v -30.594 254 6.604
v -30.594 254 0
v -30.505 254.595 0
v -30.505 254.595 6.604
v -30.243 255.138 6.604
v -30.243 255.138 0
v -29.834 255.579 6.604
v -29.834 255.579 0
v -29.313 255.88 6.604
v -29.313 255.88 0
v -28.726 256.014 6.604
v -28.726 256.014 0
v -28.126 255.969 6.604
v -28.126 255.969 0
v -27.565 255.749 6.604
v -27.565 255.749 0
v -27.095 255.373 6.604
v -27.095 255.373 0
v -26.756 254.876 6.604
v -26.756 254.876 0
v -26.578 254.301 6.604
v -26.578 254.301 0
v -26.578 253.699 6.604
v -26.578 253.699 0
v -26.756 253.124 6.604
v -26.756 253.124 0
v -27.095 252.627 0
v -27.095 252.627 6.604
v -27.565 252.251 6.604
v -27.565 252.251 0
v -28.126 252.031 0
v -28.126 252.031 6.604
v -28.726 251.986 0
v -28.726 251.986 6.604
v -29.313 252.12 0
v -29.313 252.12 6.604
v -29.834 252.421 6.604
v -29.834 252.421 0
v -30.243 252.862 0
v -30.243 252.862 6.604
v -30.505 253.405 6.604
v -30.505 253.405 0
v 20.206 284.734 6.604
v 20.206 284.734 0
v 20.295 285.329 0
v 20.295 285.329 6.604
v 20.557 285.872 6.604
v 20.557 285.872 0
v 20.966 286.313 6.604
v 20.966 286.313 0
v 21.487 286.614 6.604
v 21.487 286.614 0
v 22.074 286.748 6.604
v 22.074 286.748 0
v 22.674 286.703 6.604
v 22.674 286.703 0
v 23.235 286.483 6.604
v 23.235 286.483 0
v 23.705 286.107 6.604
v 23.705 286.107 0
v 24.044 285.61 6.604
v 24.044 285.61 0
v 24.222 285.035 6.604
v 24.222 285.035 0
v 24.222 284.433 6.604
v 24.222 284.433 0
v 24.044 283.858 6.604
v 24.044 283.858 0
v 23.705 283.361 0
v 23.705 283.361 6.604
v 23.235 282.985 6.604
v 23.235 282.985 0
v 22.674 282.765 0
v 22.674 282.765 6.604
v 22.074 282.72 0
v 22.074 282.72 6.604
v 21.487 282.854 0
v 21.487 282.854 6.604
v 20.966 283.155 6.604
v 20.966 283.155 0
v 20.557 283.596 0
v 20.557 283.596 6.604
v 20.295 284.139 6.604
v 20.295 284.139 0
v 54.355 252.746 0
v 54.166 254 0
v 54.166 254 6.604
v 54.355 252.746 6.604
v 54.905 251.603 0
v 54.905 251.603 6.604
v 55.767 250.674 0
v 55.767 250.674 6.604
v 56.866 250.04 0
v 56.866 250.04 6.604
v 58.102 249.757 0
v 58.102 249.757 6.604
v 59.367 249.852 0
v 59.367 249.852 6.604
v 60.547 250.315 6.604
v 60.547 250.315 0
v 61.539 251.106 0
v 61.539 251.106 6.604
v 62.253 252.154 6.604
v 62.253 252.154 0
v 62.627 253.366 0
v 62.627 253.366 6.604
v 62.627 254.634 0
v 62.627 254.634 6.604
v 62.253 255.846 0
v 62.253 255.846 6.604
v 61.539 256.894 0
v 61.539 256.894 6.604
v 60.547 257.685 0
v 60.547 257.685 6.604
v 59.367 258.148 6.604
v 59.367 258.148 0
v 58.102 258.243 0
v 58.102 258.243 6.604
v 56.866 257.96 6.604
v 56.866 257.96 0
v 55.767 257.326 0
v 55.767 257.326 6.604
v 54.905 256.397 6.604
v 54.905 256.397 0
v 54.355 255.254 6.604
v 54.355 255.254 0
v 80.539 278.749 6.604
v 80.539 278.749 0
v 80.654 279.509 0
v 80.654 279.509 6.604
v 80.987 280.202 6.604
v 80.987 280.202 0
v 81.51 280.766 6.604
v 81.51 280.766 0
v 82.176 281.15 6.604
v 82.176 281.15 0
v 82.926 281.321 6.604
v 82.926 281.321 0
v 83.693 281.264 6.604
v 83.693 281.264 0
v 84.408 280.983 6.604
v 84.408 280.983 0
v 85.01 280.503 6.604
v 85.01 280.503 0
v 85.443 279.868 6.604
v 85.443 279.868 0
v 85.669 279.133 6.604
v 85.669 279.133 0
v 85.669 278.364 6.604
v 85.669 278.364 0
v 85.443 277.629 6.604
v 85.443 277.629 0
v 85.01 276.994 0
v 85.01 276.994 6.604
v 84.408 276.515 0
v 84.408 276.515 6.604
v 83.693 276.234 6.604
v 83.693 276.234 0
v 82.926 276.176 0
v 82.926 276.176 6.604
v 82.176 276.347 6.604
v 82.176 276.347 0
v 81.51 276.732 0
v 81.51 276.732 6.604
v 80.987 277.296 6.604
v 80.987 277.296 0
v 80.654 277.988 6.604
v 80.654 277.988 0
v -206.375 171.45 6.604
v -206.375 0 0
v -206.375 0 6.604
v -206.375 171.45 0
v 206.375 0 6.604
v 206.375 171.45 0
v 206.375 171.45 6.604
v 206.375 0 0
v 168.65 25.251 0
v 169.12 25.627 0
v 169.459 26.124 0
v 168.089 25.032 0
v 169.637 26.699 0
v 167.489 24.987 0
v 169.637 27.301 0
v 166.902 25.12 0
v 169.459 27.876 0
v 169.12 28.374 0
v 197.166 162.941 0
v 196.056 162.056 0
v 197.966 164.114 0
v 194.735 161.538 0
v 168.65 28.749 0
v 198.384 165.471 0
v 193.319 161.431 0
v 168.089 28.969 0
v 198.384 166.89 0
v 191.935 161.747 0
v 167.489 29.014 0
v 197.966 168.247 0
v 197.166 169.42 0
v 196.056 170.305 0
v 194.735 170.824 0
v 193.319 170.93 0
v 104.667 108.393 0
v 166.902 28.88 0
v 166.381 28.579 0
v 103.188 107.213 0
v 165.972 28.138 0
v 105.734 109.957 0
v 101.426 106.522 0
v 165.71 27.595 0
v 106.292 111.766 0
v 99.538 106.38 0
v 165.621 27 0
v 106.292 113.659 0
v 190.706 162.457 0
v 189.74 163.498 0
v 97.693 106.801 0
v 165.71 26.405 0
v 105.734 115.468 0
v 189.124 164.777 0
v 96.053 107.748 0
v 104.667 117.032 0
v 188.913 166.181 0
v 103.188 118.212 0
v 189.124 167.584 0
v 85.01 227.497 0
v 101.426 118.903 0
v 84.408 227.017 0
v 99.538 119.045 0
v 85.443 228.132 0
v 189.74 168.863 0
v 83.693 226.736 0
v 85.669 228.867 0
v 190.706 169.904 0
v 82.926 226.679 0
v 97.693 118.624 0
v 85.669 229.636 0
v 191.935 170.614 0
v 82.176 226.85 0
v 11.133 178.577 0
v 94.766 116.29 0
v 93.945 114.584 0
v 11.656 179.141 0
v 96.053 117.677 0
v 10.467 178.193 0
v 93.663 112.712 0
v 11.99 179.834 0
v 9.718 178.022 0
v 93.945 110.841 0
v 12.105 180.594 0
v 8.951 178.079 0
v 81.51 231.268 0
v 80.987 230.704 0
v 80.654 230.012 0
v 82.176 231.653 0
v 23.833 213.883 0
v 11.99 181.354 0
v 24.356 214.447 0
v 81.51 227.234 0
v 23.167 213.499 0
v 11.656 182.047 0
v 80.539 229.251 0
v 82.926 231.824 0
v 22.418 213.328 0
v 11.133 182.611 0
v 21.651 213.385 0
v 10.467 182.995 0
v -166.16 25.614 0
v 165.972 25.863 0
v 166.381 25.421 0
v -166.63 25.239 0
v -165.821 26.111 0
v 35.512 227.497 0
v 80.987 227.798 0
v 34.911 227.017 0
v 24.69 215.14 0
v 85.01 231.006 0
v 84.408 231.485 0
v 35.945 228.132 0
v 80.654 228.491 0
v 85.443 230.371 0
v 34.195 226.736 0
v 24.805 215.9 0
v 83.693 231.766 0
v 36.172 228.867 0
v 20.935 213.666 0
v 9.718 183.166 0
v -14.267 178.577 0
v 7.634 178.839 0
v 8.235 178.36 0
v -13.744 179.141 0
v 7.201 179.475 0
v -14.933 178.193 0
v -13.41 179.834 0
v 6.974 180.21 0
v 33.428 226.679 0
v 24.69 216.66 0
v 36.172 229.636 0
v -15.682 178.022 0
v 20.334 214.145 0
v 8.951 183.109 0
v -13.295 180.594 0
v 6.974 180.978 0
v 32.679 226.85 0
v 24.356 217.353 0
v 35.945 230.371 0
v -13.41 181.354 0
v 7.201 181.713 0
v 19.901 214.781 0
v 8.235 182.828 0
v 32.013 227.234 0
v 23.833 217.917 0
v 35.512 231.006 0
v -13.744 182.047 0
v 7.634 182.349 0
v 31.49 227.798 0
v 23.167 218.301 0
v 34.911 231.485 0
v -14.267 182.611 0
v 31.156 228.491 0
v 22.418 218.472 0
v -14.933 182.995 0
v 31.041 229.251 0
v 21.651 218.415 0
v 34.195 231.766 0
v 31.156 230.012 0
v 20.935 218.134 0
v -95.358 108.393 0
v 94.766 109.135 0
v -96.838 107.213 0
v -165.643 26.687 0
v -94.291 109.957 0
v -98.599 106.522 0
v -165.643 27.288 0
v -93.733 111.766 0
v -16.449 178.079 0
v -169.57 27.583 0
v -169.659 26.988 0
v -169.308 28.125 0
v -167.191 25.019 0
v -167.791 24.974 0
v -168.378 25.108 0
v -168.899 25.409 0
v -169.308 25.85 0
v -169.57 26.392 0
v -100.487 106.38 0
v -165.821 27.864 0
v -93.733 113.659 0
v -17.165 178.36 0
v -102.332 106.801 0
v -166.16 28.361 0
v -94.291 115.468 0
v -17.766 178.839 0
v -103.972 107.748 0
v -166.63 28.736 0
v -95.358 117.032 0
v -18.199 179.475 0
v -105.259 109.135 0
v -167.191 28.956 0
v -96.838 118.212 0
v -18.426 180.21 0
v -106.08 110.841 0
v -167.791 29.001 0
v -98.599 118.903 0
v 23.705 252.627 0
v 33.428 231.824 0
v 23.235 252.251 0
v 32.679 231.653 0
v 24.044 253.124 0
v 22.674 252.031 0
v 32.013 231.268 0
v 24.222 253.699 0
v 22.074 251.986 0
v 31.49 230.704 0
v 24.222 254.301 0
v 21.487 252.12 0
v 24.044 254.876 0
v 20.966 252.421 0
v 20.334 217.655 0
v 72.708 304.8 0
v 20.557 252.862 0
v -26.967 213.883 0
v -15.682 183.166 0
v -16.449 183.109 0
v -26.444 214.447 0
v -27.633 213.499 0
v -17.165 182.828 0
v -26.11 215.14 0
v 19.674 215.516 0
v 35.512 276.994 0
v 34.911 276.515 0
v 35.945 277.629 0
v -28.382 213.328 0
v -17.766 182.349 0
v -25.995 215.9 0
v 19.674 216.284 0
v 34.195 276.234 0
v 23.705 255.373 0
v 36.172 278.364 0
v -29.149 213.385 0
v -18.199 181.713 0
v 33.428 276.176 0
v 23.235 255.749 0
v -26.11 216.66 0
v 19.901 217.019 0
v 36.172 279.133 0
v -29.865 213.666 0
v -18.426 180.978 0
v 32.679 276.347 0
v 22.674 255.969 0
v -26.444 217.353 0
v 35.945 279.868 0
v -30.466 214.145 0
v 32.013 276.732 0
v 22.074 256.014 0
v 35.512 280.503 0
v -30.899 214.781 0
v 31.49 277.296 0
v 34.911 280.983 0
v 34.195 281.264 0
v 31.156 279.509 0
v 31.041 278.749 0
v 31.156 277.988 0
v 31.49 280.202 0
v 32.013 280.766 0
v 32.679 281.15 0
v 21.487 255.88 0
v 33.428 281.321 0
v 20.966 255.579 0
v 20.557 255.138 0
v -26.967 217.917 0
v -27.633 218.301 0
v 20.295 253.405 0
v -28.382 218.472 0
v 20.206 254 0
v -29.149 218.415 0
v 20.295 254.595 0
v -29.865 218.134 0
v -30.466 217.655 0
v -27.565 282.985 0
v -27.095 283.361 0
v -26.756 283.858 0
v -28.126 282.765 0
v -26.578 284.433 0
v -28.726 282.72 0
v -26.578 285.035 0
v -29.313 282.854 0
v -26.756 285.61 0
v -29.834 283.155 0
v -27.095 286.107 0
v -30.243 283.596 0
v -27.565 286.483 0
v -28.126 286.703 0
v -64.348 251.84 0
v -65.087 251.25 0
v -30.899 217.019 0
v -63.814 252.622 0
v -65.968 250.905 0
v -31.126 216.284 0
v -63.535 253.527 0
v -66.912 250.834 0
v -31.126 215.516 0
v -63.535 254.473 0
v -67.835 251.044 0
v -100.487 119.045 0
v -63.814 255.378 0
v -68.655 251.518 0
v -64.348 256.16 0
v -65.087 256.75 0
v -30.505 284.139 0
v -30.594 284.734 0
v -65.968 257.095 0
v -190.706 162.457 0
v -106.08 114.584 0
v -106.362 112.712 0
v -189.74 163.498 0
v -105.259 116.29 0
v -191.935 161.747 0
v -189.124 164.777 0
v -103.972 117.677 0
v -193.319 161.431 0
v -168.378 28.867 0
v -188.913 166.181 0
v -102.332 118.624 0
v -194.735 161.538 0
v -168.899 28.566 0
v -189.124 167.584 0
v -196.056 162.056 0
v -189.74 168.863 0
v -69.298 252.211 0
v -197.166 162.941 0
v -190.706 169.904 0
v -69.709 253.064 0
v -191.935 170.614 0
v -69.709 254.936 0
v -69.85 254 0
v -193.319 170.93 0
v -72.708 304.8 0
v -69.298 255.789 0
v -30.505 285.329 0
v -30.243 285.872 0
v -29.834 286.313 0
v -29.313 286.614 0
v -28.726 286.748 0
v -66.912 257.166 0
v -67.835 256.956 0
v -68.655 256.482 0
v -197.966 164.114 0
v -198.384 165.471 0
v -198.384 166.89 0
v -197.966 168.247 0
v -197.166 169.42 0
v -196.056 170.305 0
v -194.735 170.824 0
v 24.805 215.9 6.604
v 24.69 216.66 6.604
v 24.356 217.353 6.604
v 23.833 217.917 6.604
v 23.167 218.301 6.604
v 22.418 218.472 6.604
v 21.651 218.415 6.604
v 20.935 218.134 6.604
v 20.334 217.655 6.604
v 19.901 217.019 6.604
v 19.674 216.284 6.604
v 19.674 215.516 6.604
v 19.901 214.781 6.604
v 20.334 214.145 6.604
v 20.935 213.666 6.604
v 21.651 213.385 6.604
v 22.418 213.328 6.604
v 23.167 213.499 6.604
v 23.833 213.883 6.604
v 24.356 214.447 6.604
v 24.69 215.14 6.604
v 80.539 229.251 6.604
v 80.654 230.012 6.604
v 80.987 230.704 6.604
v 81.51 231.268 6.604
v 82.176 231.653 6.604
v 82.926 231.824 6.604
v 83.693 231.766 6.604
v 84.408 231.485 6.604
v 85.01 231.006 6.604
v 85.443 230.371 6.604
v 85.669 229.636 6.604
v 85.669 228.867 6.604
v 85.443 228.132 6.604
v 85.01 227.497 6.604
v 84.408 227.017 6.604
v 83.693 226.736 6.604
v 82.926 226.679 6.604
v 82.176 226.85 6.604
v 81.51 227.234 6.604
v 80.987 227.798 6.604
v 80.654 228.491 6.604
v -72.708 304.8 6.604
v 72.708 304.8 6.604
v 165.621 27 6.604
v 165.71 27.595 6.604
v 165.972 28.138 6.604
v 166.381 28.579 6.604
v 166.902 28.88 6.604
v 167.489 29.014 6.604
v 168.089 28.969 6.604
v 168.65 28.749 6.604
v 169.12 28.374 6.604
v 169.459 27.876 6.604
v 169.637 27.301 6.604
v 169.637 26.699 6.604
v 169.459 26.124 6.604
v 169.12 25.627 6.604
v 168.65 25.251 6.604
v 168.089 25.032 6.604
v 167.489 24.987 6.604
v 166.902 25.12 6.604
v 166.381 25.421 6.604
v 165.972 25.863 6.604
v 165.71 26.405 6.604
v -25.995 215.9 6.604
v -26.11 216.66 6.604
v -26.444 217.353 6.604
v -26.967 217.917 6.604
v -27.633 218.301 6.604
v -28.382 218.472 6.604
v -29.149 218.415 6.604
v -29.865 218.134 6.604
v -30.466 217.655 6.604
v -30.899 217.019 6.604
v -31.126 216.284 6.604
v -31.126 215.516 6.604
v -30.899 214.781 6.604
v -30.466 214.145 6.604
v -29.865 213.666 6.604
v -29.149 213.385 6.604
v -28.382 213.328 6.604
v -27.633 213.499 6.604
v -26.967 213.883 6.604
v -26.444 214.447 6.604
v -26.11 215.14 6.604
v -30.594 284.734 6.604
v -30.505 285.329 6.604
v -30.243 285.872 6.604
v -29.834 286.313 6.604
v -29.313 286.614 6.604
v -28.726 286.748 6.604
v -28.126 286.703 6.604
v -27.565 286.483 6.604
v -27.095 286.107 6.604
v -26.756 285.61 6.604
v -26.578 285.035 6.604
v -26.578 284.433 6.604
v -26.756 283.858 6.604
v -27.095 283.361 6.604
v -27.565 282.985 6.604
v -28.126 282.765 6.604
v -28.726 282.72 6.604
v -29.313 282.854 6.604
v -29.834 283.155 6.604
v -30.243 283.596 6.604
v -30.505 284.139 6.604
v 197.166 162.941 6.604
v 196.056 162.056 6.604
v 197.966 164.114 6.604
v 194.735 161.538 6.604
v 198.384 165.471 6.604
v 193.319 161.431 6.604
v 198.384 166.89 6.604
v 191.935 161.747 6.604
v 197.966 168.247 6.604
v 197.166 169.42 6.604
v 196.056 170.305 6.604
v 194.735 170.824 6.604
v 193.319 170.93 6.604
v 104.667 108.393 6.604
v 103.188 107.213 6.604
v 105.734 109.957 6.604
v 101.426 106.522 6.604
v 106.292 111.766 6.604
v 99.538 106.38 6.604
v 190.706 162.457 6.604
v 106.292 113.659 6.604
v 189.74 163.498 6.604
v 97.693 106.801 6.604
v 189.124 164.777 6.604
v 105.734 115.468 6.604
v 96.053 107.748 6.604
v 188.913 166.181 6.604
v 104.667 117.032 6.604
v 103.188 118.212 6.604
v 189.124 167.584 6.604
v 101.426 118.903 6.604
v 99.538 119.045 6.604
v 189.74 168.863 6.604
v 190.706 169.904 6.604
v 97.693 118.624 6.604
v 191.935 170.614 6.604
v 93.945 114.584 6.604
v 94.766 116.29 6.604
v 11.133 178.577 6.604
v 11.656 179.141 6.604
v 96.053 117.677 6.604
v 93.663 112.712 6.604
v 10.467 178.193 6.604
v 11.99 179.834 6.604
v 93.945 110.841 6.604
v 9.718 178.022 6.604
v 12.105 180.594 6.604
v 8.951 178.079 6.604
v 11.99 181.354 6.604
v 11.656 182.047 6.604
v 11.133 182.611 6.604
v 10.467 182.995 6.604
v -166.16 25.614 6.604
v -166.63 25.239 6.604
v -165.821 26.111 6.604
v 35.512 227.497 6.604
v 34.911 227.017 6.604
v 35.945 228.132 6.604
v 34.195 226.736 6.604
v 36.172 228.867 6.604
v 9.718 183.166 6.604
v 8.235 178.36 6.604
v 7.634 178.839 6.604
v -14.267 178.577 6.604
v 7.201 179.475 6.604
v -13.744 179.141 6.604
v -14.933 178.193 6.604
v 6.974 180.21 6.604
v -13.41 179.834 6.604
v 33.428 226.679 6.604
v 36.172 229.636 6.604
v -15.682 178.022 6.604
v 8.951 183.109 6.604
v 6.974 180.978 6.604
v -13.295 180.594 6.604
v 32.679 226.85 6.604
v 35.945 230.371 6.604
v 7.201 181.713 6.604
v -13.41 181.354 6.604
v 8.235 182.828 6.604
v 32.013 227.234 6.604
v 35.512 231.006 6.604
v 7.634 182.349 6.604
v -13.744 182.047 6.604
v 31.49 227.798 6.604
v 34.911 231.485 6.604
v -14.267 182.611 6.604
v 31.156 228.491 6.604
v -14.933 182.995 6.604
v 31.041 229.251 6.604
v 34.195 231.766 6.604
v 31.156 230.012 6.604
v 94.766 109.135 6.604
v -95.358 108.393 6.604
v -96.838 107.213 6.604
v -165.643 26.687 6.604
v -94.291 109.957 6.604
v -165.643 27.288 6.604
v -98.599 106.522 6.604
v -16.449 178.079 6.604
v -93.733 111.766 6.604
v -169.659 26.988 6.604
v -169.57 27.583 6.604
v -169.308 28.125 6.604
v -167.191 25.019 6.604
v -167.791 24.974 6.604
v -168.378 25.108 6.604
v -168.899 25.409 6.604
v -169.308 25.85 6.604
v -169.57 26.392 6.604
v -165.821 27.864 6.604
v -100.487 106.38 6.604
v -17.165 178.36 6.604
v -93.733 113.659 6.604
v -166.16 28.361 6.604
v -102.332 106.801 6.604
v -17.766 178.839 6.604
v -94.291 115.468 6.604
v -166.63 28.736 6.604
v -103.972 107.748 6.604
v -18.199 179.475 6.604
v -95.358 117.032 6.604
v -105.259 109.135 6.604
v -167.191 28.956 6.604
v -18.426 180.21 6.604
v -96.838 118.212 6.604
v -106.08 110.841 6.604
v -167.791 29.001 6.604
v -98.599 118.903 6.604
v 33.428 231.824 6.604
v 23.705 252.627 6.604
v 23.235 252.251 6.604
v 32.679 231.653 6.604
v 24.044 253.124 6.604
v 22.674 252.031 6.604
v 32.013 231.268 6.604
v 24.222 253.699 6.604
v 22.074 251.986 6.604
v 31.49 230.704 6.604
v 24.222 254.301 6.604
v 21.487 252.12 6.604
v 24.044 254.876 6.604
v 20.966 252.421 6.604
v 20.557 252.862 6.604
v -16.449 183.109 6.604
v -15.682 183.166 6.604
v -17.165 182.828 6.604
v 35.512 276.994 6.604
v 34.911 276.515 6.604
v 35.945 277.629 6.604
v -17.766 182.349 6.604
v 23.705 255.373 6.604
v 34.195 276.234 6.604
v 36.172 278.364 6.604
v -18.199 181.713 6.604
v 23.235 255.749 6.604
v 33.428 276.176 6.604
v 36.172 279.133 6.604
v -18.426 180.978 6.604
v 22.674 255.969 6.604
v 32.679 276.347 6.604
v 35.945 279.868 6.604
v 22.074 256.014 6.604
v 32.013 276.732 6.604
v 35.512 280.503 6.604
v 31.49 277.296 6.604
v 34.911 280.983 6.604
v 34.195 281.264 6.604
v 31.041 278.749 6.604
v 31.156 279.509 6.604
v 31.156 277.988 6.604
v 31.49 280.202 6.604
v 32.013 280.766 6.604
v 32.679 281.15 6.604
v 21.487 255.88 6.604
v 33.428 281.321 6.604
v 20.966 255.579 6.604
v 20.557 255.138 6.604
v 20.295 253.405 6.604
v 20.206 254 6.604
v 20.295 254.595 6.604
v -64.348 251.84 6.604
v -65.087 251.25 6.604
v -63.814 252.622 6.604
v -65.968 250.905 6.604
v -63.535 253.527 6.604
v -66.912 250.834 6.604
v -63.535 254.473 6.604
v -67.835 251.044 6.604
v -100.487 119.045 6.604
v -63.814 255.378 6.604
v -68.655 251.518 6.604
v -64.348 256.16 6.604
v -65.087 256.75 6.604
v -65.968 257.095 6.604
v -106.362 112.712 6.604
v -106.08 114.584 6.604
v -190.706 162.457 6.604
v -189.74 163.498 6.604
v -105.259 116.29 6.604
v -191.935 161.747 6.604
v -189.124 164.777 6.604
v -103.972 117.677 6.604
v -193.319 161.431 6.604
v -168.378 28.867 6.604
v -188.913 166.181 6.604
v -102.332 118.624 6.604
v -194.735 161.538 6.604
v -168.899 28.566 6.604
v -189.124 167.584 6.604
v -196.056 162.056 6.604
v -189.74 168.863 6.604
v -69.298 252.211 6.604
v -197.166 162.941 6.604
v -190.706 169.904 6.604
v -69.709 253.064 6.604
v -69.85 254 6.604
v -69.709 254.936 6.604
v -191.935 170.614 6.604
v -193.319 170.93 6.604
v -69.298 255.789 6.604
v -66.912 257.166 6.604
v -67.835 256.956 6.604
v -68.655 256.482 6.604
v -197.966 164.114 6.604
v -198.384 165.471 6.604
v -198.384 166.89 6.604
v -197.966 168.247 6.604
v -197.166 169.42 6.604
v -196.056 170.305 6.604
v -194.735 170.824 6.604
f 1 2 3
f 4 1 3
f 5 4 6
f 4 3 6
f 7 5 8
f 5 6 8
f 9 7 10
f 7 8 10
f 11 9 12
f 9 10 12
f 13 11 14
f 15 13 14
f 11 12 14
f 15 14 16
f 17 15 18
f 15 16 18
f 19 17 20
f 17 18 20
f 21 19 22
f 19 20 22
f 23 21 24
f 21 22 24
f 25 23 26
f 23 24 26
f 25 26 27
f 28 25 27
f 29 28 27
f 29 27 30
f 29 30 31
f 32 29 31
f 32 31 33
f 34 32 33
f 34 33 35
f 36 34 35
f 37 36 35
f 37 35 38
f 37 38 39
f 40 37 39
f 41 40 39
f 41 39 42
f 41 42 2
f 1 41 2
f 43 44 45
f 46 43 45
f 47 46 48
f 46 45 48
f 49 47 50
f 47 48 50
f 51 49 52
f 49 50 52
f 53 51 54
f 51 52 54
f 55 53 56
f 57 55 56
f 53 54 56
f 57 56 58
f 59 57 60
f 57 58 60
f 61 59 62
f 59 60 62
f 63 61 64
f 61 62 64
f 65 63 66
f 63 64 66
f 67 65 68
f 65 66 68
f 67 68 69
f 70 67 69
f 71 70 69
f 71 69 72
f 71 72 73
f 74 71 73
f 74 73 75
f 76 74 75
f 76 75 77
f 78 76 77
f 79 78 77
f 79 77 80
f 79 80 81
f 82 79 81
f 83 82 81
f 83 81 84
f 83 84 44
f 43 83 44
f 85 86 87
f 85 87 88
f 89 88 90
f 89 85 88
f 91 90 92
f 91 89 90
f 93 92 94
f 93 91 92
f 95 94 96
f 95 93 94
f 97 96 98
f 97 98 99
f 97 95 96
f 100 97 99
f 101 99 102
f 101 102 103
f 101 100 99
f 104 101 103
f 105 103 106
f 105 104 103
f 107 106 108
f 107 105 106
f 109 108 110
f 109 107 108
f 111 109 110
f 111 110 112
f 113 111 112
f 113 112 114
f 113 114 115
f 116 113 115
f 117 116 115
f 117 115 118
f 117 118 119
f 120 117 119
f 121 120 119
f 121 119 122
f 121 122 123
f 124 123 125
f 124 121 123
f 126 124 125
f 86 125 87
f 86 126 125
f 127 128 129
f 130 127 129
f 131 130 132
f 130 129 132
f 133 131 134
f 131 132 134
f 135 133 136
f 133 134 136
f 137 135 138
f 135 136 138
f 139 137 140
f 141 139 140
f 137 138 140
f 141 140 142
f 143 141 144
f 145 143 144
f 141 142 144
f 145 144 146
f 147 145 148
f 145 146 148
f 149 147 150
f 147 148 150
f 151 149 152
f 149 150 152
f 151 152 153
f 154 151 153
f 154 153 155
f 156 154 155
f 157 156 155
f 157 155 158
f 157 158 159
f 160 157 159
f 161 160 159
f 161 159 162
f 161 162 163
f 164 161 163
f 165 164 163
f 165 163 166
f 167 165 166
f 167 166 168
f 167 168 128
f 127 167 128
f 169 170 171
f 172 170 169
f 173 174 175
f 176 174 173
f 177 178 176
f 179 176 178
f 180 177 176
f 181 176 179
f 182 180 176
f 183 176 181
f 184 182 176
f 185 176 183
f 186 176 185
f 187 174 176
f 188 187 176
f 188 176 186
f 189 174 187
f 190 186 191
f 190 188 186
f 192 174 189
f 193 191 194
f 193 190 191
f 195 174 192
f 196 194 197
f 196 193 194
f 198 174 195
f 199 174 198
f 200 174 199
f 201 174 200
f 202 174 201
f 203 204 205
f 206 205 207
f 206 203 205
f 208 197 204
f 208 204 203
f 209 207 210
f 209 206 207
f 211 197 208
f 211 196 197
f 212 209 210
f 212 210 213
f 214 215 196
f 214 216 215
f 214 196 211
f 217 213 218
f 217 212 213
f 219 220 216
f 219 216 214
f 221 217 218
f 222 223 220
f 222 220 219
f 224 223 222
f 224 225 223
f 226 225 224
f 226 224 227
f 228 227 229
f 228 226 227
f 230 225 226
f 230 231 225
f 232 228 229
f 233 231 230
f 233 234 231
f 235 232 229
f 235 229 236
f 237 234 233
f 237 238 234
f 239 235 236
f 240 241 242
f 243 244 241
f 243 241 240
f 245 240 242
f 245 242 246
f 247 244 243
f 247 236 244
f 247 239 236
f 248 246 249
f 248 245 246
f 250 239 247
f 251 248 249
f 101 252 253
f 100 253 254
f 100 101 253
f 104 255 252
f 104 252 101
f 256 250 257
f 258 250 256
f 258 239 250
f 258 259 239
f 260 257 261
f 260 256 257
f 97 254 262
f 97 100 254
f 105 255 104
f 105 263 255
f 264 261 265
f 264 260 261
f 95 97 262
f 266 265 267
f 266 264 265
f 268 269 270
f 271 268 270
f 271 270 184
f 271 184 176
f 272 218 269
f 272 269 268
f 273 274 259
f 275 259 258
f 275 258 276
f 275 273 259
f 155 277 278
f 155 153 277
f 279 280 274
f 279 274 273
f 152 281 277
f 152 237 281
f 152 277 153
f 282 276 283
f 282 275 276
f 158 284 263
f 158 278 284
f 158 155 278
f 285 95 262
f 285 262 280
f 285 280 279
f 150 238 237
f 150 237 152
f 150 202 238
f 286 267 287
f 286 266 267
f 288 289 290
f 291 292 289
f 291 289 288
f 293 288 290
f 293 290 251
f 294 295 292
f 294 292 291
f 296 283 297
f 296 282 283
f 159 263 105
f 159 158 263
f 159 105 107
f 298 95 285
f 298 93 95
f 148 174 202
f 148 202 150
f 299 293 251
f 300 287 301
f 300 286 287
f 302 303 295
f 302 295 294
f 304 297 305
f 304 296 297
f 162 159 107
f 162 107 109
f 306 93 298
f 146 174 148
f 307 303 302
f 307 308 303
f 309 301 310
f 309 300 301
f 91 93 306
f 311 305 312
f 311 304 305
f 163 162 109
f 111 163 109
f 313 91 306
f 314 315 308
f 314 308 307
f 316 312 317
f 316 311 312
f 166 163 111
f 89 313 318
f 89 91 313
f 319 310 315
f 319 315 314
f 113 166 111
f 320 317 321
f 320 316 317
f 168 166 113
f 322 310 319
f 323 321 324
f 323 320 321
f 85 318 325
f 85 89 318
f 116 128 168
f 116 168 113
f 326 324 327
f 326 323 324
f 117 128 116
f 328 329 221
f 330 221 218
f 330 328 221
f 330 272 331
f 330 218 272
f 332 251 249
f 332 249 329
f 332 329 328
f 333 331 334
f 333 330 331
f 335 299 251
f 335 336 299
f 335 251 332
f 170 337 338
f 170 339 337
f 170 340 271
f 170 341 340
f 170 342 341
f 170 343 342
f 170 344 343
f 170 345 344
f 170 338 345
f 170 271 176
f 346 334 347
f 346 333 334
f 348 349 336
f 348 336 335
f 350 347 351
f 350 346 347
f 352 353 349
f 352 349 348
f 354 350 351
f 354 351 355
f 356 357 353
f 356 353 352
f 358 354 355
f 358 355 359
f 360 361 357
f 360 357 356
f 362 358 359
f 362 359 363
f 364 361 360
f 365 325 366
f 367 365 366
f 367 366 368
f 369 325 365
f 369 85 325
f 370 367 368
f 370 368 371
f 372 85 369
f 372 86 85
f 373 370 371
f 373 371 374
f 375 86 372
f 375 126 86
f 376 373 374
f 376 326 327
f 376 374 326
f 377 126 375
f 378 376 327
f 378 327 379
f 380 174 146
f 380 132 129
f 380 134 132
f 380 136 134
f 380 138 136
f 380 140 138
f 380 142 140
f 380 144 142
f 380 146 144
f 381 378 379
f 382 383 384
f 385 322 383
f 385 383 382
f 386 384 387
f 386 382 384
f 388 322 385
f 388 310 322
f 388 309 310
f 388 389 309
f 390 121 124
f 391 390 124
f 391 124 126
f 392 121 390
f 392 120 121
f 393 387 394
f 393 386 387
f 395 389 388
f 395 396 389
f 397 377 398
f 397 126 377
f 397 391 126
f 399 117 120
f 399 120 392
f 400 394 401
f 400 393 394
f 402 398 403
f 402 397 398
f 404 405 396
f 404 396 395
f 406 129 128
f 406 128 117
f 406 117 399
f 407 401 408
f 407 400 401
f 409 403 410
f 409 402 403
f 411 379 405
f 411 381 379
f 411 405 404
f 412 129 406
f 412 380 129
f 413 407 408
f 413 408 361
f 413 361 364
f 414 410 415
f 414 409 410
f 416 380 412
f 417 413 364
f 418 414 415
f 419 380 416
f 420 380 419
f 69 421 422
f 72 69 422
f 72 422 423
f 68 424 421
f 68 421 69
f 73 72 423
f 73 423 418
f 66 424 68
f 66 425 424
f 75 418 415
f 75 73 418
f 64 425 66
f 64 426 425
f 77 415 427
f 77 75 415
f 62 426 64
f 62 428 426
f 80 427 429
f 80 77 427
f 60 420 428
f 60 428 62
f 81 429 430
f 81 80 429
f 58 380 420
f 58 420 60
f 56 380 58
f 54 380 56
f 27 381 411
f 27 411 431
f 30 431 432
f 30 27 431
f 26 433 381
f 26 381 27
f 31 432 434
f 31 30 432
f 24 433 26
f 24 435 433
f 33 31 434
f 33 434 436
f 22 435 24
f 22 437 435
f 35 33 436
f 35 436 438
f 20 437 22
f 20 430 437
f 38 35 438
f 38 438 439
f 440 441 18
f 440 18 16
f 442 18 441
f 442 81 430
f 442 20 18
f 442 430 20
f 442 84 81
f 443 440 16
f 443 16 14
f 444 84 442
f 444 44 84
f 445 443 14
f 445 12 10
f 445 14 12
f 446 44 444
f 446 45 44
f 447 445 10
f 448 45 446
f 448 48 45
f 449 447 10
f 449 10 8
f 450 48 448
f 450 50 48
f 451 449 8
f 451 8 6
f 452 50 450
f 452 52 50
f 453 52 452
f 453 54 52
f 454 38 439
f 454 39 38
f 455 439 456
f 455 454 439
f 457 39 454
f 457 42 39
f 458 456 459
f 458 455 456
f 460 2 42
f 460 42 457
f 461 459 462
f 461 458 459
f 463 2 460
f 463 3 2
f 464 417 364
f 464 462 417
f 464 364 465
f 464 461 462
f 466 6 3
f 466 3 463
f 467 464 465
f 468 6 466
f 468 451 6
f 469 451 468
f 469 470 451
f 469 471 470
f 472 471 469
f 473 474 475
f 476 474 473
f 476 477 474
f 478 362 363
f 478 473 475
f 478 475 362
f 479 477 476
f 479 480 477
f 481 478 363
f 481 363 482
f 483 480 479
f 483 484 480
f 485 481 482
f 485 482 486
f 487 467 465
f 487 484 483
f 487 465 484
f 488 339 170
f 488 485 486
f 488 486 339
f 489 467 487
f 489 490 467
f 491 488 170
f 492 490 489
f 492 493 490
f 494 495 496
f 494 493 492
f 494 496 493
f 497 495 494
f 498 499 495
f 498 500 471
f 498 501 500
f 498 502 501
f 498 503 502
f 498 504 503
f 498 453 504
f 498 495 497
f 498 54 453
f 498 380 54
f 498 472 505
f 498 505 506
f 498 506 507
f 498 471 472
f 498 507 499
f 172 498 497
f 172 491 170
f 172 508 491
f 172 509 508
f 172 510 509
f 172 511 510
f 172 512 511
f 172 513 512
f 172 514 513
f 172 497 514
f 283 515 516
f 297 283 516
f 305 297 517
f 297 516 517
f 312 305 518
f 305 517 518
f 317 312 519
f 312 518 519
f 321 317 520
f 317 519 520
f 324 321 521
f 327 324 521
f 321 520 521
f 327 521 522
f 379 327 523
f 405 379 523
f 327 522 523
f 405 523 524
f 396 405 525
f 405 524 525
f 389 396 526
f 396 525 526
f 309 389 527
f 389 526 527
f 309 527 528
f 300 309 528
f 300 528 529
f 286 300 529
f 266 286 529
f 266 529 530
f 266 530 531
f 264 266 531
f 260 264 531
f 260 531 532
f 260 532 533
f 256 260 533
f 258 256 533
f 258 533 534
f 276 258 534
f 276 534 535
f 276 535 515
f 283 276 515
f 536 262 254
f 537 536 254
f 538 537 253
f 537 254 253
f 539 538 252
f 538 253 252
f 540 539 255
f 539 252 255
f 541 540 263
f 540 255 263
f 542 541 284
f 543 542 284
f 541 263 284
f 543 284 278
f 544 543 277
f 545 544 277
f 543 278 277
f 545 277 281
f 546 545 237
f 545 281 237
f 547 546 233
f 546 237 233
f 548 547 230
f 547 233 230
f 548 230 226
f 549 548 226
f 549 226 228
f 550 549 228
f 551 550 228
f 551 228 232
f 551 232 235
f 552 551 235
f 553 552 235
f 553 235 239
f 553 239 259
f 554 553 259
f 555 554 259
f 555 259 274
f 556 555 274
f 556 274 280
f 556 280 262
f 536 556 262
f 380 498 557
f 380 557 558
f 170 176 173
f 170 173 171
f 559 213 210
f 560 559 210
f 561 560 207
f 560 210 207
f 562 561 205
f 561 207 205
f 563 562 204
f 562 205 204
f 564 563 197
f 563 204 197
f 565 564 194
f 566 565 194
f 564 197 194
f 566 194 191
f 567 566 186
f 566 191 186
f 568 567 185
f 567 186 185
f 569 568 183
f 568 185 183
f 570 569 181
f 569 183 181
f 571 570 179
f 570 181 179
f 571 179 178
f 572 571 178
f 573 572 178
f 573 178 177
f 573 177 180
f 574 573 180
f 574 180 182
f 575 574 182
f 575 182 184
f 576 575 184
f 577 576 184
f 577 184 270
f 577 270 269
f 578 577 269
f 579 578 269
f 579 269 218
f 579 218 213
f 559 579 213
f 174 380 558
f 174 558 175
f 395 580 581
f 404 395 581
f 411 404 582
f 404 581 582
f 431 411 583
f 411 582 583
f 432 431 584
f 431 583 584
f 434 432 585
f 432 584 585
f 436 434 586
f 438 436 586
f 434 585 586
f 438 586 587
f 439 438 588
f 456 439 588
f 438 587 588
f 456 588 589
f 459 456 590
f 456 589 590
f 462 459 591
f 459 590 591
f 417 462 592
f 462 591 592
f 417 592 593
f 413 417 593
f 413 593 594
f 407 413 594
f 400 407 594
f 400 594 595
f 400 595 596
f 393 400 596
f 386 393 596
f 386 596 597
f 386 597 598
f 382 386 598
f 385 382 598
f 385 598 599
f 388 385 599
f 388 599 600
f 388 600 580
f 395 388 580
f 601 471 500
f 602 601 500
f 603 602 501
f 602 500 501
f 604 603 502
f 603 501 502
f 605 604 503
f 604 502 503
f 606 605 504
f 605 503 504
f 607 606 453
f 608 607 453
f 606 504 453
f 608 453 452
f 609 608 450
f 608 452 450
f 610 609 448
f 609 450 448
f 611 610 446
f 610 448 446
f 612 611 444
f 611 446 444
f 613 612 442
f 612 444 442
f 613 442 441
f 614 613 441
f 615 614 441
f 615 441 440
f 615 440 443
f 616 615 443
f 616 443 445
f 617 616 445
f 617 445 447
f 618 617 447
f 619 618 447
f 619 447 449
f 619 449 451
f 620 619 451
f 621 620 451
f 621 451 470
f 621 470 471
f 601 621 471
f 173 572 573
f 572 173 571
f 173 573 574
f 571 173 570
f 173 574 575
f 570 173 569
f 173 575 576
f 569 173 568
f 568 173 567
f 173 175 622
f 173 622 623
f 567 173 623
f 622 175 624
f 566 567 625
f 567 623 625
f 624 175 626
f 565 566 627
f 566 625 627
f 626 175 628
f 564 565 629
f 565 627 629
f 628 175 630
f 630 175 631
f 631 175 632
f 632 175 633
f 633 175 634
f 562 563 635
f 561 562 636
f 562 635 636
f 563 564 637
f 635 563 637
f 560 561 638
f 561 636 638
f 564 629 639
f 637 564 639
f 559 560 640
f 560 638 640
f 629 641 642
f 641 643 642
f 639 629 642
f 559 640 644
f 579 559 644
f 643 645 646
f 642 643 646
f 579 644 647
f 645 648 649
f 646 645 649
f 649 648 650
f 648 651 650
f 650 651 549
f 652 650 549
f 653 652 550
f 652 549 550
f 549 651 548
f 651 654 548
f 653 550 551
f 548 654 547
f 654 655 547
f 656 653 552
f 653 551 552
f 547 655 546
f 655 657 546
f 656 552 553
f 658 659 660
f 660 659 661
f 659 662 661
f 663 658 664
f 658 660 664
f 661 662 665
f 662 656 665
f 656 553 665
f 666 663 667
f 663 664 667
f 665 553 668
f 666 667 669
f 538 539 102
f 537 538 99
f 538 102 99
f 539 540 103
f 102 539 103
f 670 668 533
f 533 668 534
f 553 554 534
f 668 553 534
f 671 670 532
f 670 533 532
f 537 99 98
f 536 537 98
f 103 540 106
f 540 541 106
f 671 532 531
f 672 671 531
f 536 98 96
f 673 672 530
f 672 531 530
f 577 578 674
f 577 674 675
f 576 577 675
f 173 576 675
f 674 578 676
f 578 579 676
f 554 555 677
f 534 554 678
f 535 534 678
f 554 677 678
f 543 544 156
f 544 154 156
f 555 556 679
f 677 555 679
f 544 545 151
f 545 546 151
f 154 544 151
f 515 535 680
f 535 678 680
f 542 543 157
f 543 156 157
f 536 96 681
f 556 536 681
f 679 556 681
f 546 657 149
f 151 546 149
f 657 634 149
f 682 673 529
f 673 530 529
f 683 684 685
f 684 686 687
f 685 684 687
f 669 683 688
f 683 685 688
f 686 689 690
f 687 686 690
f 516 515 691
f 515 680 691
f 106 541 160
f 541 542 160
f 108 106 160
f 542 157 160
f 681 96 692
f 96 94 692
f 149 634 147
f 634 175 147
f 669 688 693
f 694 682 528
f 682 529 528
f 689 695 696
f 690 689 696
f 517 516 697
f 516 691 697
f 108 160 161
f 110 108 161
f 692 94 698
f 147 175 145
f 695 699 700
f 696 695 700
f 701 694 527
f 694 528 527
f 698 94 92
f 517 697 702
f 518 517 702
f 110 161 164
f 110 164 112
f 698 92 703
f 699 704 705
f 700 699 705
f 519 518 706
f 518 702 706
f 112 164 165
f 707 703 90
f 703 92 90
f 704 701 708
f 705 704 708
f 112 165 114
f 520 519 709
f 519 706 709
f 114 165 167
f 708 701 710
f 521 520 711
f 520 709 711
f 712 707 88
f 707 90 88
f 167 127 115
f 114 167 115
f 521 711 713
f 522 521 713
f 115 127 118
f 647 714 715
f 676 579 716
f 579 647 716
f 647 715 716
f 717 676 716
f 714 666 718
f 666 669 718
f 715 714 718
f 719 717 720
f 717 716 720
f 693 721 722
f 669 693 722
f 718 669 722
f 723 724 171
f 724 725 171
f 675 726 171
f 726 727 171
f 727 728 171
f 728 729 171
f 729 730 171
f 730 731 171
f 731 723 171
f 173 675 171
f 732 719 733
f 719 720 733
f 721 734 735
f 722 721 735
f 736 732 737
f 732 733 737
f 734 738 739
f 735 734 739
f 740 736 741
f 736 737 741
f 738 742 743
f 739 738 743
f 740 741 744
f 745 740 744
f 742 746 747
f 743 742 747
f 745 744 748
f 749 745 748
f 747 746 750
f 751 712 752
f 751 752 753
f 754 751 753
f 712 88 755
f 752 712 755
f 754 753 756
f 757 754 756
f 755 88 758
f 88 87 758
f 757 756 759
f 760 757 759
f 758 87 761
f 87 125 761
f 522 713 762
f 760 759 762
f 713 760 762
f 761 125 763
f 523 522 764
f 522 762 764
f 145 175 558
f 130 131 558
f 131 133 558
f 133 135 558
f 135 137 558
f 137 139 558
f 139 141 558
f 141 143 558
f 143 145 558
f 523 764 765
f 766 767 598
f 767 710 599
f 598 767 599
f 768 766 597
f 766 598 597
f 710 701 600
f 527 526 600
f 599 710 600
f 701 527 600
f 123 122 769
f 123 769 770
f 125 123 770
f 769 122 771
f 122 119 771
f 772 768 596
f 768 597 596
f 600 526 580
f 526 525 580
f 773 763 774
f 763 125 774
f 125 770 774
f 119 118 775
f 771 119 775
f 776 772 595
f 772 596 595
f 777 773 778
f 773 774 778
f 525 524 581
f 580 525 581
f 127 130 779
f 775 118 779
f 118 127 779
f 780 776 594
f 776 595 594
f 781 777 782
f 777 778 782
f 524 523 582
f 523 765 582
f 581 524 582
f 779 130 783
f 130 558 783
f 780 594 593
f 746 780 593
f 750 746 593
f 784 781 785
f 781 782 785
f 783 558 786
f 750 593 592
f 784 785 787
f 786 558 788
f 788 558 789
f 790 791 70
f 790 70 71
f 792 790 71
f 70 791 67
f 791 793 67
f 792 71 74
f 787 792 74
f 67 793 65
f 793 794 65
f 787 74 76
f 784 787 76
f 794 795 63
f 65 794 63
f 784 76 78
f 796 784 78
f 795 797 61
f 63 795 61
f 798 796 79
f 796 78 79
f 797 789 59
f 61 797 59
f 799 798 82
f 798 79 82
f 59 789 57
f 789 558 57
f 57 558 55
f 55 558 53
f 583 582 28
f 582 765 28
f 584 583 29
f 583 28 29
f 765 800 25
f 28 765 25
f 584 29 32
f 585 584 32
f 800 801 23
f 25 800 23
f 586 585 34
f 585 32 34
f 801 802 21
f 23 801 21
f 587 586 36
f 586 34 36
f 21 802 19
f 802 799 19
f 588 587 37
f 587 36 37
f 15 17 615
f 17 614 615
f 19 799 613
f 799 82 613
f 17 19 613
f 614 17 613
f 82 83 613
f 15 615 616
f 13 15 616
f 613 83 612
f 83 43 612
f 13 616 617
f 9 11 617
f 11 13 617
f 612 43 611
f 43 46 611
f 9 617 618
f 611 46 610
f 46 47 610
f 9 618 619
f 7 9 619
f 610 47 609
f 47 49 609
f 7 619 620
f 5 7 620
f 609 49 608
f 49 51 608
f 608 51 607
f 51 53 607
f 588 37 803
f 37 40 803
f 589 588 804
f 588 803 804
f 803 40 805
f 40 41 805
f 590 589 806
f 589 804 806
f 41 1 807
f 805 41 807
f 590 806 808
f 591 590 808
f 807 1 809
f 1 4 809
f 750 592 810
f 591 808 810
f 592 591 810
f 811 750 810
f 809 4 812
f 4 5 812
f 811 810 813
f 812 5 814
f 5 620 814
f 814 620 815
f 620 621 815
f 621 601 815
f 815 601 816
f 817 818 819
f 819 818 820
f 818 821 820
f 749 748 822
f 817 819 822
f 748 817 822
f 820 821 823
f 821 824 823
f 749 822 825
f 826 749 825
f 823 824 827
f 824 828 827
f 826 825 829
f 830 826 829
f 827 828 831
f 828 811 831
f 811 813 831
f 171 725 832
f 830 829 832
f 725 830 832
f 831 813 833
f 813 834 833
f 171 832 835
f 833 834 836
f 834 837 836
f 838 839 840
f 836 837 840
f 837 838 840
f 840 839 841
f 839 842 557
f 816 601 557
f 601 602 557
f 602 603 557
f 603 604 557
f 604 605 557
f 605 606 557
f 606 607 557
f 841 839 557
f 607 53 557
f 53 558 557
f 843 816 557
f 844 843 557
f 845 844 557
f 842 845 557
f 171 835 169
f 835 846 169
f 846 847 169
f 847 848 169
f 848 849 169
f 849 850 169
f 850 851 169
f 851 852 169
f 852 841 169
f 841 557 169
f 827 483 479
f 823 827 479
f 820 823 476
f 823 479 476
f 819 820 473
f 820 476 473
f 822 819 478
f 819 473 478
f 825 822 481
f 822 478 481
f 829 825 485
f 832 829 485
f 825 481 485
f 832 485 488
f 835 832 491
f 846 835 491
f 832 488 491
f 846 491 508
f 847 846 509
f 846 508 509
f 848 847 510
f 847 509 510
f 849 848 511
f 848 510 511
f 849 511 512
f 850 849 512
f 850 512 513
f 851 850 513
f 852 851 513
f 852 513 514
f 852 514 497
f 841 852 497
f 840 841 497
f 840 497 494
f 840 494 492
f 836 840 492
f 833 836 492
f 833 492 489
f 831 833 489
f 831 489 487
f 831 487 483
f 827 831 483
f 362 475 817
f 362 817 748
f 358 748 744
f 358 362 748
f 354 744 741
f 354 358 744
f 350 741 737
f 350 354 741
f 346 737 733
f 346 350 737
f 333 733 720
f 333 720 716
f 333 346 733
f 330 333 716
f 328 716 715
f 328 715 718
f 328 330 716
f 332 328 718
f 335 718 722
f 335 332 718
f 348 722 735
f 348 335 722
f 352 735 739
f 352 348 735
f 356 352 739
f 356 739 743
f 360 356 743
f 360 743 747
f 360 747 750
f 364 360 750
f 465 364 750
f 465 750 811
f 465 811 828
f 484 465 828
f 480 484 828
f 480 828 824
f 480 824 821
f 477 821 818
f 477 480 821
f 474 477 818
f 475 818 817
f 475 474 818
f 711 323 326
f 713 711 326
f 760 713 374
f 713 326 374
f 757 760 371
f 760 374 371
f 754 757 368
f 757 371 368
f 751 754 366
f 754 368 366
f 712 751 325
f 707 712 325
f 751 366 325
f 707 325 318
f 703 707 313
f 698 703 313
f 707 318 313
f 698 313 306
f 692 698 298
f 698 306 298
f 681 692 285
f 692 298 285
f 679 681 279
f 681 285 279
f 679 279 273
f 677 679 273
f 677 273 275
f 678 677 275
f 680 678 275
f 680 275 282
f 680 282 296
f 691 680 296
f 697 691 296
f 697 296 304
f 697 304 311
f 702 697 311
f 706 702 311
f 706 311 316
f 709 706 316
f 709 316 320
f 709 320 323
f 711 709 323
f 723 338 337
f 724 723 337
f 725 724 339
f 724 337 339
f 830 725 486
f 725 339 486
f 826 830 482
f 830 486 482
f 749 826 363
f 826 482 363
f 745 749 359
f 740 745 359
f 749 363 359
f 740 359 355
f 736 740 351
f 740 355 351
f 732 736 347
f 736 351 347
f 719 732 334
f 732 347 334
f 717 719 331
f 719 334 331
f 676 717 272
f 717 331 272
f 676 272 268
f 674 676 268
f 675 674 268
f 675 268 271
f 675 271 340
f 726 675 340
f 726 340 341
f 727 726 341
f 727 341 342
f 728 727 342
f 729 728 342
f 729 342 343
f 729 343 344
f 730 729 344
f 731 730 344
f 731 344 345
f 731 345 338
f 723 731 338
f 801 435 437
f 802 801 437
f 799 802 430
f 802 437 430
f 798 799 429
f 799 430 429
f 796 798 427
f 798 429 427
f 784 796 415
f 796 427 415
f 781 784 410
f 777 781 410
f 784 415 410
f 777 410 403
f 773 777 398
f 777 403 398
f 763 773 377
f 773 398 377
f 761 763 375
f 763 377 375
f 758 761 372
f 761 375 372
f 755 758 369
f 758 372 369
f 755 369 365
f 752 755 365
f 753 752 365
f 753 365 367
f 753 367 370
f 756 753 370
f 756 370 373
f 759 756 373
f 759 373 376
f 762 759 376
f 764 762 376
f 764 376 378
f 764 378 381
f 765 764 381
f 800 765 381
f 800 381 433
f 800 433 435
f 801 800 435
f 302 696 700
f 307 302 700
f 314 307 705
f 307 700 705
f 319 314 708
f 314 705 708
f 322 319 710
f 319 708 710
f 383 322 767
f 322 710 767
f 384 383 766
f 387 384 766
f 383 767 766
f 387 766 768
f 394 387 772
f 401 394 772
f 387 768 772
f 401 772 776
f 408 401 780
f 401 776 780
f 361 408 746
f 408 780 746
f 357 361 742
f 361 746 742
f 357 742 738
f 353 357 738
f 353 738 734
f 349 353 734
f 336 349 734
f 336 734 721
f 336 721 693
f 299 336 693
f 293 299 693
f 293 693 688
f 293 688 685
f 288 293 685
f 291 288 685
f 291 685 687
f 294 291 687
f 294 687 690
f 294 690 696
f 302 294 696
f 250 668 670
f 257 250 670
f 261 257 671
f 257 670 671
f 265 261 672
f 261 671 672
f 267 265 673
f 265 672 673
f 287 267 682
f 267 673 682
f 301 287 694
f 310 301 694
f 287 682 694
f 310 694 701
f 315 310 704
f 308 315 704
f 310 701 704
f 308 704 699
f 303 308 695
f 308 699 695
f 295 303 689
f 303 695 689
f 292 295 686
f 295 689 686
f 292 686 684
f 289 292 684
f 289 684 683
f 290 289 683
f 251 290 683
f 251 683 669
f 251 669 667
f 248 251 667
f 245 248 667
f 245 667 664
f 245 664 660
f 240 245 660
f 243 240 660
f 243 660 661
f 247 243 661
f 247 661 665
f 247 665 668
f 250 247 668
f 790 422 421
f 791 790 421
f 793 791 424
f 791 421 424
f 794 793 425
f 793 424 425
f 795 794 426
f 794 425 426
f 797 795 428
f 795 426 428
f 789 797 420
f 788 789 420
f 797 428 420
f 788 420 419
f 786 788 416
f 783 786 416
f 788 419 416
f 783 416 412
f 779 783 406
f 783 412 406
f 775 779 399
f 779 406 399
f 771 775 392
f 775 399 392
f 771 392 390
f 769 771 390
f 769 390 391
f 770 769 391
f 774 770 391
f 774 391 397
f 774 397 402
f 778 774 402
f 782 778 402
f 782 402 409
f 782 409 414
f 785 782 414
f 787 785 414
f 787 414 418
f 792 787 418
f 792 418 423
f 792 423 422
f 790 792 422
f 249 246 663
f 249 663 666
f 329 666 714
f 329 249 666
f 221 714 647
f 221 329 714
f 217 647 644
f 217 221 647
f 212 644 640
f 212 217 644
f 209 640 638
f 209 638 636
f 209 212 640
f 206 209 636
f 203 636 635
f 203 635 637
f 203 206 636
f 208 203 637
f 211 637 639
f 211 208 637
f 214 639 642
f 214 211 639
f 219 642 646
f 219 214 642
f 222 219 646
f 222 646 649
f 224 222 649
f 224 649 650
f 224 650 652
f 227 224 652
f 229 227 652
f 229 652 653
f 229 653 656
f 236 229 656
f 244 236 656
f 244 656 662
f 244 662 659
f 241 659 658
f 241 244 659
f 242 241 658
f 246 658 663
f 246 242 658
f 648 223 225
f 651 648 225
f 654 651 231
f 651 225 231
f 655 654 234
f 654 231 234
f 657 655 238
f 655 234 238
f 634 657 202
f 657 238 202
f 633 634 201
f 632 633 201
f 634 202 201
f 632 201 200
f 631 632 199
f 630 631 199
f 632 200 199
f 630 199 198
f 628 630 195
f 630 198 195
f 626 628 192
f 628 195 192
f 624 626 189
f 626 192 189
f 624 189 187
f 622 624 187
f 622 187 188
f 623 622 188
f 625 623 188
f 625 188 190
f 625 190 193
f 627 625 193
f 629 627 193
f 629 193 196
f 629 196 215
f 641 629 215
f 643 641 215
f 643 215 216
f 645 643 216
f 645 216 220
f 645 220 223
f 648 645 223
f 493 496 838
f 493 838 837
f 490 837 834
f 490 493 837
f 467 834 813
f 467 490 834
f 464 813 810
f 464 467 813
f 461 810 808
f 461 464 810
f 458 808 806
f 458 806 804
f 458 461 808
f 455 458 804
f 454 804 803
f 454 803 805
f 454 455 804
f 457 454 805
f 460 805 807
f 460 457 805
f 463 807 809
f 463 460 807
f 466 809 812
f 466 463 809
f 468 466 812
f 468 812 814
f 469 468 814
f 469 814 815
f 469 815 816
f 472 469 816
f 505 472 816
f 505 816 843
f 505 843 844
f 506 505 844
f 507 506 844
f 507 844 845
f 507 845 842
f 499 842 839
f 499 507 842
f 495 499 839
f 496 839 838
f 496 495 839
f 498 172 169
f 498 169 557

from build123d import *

# Parameters (mm, degrees)
REFERENCE_R            = 6.35
REFERENCE_R_2          = 3.175
REFERENCE_R_3          = 4.2545
BOSS_EXTRUDE3_DEPTH    = 6.604
F_10_32_TAPPED_HOLE1_D = 4.0386
SKETCH3_R              = 2.5796875
CUT_EXTRUDE1_DEPTH     = 369.153899125
SKETCH4_R              = 2.5796875
CUT_EXTRUDE2_DEPTH     = 369.153899125
SKETCH5_R              = 4.7625
CUT_EXTRUDE3_DEPTH     = 369.153899125


with BuildPart() as part:
    # reference → Boss-Extrude3 (new body)
    with BuildSketch(Plane.XY):
        Polygon((206.375, 0), (-206.375, 0), (-206.375, 171.45), (-72.7075, 304.8), (72.7075, 304.8), (206.375, 171.45), align=None)
        with Locations(Location((-100.0125, 112.7125, 0), (0, 0, 180))):
            Circle(REFERENCE_R, mode=Mode.SUBTRACT)
        with Locations(Location((100.0125, 112.7125, 0), (0, 0, 180))):
            Circle(REFERENCE_R, mode=Mode.SUBTRACT)
        with Locations(Location((-66.675, 254, 0), (0, 0, 180))):
            Circle(REFERENCE_R_2, mode=Mode.SUBTRACT)
        with Locations(Location((58.42, 254, 0), (0, 0, 180))):
            Circle(REFERENCE_R_3, mode=Mode.SUBTRACT)
    extrude(amount=BOSS_EXTRUDE3_DEPTH)

    # #10-32 Tapped Hole1 (through all)
    with Locations(Plane.XY.offset(6.604)):
        with Locations((-167.64, 26.9875), (167.64, 27.0002), (-28.575, 284.734), (22.225, 284.734), (-28.575, 254), (22.225, 254)):
            Hole(F_10_32_TAPPED_HOLE1_D / 2)

    # Sketch3 → Cut-Extrude1 (cut, through all)
    with BuildSketch(Plane(origin=(0, 0, 0), x_dir=(-1, 0, 0), z_dir=(0, 0, -1))):
        with Locations((-33.62112915, 278.748737342)):
            Circle(SKETCH3_R)
        with Locations((-33.62112915, 229.251262658)):
            Circle(SKETCH3_R)
        with Locations((-83.118603833, 229.251262658)):
            Circle(SKETCH3_R)
        with Locations((-83.118603833, 278.748737342)):
            Circle(SKETCH3_R)
    extrude(amount=-CUT_EXTRUDE1_DEPTH, mode=Mode.SUBTRACT)

    # Sketch4 → Cut-Extrude2 (cut, through all)
    with BuildSketch(Plane.XY.offset(6.604)):
        with Locations((-28.575, 215.9)):
            Circle(SKETCH4_R)
        with Locations((22.225, 215.9)):
            Circle(SKETCH4_R)
        with Locations((-15.875, 180.594)):
            Circle(SKETCH4_R)
        with Locations((9.525, 180.594)):
            Circle(SKETCH4_R)
    extrude(amount=-CUT_EXTRUDE2_DEPTH, mode=Mode.SUBTRACT)

    # Sketch5 → Cut-Extrude3 (cut, through all)
    with BuildSketch(Plane(origin=(0, 0, 0), x_dir=(-1, 0, 0), z_dir=(0, 0, -1))):
        with Locations((-193.675, 166.18063958)):
            Circle(SKETCH5_R)
        with Locations(Location((193.675, 166.18063958, 0), (0, 0, 180))):
            Circle(SKETCH5_R)
    extrude(amount=-CUT_EXTRUDE3_DEPTH, mode=Mode.SUBTRACT)


solid = part.part
